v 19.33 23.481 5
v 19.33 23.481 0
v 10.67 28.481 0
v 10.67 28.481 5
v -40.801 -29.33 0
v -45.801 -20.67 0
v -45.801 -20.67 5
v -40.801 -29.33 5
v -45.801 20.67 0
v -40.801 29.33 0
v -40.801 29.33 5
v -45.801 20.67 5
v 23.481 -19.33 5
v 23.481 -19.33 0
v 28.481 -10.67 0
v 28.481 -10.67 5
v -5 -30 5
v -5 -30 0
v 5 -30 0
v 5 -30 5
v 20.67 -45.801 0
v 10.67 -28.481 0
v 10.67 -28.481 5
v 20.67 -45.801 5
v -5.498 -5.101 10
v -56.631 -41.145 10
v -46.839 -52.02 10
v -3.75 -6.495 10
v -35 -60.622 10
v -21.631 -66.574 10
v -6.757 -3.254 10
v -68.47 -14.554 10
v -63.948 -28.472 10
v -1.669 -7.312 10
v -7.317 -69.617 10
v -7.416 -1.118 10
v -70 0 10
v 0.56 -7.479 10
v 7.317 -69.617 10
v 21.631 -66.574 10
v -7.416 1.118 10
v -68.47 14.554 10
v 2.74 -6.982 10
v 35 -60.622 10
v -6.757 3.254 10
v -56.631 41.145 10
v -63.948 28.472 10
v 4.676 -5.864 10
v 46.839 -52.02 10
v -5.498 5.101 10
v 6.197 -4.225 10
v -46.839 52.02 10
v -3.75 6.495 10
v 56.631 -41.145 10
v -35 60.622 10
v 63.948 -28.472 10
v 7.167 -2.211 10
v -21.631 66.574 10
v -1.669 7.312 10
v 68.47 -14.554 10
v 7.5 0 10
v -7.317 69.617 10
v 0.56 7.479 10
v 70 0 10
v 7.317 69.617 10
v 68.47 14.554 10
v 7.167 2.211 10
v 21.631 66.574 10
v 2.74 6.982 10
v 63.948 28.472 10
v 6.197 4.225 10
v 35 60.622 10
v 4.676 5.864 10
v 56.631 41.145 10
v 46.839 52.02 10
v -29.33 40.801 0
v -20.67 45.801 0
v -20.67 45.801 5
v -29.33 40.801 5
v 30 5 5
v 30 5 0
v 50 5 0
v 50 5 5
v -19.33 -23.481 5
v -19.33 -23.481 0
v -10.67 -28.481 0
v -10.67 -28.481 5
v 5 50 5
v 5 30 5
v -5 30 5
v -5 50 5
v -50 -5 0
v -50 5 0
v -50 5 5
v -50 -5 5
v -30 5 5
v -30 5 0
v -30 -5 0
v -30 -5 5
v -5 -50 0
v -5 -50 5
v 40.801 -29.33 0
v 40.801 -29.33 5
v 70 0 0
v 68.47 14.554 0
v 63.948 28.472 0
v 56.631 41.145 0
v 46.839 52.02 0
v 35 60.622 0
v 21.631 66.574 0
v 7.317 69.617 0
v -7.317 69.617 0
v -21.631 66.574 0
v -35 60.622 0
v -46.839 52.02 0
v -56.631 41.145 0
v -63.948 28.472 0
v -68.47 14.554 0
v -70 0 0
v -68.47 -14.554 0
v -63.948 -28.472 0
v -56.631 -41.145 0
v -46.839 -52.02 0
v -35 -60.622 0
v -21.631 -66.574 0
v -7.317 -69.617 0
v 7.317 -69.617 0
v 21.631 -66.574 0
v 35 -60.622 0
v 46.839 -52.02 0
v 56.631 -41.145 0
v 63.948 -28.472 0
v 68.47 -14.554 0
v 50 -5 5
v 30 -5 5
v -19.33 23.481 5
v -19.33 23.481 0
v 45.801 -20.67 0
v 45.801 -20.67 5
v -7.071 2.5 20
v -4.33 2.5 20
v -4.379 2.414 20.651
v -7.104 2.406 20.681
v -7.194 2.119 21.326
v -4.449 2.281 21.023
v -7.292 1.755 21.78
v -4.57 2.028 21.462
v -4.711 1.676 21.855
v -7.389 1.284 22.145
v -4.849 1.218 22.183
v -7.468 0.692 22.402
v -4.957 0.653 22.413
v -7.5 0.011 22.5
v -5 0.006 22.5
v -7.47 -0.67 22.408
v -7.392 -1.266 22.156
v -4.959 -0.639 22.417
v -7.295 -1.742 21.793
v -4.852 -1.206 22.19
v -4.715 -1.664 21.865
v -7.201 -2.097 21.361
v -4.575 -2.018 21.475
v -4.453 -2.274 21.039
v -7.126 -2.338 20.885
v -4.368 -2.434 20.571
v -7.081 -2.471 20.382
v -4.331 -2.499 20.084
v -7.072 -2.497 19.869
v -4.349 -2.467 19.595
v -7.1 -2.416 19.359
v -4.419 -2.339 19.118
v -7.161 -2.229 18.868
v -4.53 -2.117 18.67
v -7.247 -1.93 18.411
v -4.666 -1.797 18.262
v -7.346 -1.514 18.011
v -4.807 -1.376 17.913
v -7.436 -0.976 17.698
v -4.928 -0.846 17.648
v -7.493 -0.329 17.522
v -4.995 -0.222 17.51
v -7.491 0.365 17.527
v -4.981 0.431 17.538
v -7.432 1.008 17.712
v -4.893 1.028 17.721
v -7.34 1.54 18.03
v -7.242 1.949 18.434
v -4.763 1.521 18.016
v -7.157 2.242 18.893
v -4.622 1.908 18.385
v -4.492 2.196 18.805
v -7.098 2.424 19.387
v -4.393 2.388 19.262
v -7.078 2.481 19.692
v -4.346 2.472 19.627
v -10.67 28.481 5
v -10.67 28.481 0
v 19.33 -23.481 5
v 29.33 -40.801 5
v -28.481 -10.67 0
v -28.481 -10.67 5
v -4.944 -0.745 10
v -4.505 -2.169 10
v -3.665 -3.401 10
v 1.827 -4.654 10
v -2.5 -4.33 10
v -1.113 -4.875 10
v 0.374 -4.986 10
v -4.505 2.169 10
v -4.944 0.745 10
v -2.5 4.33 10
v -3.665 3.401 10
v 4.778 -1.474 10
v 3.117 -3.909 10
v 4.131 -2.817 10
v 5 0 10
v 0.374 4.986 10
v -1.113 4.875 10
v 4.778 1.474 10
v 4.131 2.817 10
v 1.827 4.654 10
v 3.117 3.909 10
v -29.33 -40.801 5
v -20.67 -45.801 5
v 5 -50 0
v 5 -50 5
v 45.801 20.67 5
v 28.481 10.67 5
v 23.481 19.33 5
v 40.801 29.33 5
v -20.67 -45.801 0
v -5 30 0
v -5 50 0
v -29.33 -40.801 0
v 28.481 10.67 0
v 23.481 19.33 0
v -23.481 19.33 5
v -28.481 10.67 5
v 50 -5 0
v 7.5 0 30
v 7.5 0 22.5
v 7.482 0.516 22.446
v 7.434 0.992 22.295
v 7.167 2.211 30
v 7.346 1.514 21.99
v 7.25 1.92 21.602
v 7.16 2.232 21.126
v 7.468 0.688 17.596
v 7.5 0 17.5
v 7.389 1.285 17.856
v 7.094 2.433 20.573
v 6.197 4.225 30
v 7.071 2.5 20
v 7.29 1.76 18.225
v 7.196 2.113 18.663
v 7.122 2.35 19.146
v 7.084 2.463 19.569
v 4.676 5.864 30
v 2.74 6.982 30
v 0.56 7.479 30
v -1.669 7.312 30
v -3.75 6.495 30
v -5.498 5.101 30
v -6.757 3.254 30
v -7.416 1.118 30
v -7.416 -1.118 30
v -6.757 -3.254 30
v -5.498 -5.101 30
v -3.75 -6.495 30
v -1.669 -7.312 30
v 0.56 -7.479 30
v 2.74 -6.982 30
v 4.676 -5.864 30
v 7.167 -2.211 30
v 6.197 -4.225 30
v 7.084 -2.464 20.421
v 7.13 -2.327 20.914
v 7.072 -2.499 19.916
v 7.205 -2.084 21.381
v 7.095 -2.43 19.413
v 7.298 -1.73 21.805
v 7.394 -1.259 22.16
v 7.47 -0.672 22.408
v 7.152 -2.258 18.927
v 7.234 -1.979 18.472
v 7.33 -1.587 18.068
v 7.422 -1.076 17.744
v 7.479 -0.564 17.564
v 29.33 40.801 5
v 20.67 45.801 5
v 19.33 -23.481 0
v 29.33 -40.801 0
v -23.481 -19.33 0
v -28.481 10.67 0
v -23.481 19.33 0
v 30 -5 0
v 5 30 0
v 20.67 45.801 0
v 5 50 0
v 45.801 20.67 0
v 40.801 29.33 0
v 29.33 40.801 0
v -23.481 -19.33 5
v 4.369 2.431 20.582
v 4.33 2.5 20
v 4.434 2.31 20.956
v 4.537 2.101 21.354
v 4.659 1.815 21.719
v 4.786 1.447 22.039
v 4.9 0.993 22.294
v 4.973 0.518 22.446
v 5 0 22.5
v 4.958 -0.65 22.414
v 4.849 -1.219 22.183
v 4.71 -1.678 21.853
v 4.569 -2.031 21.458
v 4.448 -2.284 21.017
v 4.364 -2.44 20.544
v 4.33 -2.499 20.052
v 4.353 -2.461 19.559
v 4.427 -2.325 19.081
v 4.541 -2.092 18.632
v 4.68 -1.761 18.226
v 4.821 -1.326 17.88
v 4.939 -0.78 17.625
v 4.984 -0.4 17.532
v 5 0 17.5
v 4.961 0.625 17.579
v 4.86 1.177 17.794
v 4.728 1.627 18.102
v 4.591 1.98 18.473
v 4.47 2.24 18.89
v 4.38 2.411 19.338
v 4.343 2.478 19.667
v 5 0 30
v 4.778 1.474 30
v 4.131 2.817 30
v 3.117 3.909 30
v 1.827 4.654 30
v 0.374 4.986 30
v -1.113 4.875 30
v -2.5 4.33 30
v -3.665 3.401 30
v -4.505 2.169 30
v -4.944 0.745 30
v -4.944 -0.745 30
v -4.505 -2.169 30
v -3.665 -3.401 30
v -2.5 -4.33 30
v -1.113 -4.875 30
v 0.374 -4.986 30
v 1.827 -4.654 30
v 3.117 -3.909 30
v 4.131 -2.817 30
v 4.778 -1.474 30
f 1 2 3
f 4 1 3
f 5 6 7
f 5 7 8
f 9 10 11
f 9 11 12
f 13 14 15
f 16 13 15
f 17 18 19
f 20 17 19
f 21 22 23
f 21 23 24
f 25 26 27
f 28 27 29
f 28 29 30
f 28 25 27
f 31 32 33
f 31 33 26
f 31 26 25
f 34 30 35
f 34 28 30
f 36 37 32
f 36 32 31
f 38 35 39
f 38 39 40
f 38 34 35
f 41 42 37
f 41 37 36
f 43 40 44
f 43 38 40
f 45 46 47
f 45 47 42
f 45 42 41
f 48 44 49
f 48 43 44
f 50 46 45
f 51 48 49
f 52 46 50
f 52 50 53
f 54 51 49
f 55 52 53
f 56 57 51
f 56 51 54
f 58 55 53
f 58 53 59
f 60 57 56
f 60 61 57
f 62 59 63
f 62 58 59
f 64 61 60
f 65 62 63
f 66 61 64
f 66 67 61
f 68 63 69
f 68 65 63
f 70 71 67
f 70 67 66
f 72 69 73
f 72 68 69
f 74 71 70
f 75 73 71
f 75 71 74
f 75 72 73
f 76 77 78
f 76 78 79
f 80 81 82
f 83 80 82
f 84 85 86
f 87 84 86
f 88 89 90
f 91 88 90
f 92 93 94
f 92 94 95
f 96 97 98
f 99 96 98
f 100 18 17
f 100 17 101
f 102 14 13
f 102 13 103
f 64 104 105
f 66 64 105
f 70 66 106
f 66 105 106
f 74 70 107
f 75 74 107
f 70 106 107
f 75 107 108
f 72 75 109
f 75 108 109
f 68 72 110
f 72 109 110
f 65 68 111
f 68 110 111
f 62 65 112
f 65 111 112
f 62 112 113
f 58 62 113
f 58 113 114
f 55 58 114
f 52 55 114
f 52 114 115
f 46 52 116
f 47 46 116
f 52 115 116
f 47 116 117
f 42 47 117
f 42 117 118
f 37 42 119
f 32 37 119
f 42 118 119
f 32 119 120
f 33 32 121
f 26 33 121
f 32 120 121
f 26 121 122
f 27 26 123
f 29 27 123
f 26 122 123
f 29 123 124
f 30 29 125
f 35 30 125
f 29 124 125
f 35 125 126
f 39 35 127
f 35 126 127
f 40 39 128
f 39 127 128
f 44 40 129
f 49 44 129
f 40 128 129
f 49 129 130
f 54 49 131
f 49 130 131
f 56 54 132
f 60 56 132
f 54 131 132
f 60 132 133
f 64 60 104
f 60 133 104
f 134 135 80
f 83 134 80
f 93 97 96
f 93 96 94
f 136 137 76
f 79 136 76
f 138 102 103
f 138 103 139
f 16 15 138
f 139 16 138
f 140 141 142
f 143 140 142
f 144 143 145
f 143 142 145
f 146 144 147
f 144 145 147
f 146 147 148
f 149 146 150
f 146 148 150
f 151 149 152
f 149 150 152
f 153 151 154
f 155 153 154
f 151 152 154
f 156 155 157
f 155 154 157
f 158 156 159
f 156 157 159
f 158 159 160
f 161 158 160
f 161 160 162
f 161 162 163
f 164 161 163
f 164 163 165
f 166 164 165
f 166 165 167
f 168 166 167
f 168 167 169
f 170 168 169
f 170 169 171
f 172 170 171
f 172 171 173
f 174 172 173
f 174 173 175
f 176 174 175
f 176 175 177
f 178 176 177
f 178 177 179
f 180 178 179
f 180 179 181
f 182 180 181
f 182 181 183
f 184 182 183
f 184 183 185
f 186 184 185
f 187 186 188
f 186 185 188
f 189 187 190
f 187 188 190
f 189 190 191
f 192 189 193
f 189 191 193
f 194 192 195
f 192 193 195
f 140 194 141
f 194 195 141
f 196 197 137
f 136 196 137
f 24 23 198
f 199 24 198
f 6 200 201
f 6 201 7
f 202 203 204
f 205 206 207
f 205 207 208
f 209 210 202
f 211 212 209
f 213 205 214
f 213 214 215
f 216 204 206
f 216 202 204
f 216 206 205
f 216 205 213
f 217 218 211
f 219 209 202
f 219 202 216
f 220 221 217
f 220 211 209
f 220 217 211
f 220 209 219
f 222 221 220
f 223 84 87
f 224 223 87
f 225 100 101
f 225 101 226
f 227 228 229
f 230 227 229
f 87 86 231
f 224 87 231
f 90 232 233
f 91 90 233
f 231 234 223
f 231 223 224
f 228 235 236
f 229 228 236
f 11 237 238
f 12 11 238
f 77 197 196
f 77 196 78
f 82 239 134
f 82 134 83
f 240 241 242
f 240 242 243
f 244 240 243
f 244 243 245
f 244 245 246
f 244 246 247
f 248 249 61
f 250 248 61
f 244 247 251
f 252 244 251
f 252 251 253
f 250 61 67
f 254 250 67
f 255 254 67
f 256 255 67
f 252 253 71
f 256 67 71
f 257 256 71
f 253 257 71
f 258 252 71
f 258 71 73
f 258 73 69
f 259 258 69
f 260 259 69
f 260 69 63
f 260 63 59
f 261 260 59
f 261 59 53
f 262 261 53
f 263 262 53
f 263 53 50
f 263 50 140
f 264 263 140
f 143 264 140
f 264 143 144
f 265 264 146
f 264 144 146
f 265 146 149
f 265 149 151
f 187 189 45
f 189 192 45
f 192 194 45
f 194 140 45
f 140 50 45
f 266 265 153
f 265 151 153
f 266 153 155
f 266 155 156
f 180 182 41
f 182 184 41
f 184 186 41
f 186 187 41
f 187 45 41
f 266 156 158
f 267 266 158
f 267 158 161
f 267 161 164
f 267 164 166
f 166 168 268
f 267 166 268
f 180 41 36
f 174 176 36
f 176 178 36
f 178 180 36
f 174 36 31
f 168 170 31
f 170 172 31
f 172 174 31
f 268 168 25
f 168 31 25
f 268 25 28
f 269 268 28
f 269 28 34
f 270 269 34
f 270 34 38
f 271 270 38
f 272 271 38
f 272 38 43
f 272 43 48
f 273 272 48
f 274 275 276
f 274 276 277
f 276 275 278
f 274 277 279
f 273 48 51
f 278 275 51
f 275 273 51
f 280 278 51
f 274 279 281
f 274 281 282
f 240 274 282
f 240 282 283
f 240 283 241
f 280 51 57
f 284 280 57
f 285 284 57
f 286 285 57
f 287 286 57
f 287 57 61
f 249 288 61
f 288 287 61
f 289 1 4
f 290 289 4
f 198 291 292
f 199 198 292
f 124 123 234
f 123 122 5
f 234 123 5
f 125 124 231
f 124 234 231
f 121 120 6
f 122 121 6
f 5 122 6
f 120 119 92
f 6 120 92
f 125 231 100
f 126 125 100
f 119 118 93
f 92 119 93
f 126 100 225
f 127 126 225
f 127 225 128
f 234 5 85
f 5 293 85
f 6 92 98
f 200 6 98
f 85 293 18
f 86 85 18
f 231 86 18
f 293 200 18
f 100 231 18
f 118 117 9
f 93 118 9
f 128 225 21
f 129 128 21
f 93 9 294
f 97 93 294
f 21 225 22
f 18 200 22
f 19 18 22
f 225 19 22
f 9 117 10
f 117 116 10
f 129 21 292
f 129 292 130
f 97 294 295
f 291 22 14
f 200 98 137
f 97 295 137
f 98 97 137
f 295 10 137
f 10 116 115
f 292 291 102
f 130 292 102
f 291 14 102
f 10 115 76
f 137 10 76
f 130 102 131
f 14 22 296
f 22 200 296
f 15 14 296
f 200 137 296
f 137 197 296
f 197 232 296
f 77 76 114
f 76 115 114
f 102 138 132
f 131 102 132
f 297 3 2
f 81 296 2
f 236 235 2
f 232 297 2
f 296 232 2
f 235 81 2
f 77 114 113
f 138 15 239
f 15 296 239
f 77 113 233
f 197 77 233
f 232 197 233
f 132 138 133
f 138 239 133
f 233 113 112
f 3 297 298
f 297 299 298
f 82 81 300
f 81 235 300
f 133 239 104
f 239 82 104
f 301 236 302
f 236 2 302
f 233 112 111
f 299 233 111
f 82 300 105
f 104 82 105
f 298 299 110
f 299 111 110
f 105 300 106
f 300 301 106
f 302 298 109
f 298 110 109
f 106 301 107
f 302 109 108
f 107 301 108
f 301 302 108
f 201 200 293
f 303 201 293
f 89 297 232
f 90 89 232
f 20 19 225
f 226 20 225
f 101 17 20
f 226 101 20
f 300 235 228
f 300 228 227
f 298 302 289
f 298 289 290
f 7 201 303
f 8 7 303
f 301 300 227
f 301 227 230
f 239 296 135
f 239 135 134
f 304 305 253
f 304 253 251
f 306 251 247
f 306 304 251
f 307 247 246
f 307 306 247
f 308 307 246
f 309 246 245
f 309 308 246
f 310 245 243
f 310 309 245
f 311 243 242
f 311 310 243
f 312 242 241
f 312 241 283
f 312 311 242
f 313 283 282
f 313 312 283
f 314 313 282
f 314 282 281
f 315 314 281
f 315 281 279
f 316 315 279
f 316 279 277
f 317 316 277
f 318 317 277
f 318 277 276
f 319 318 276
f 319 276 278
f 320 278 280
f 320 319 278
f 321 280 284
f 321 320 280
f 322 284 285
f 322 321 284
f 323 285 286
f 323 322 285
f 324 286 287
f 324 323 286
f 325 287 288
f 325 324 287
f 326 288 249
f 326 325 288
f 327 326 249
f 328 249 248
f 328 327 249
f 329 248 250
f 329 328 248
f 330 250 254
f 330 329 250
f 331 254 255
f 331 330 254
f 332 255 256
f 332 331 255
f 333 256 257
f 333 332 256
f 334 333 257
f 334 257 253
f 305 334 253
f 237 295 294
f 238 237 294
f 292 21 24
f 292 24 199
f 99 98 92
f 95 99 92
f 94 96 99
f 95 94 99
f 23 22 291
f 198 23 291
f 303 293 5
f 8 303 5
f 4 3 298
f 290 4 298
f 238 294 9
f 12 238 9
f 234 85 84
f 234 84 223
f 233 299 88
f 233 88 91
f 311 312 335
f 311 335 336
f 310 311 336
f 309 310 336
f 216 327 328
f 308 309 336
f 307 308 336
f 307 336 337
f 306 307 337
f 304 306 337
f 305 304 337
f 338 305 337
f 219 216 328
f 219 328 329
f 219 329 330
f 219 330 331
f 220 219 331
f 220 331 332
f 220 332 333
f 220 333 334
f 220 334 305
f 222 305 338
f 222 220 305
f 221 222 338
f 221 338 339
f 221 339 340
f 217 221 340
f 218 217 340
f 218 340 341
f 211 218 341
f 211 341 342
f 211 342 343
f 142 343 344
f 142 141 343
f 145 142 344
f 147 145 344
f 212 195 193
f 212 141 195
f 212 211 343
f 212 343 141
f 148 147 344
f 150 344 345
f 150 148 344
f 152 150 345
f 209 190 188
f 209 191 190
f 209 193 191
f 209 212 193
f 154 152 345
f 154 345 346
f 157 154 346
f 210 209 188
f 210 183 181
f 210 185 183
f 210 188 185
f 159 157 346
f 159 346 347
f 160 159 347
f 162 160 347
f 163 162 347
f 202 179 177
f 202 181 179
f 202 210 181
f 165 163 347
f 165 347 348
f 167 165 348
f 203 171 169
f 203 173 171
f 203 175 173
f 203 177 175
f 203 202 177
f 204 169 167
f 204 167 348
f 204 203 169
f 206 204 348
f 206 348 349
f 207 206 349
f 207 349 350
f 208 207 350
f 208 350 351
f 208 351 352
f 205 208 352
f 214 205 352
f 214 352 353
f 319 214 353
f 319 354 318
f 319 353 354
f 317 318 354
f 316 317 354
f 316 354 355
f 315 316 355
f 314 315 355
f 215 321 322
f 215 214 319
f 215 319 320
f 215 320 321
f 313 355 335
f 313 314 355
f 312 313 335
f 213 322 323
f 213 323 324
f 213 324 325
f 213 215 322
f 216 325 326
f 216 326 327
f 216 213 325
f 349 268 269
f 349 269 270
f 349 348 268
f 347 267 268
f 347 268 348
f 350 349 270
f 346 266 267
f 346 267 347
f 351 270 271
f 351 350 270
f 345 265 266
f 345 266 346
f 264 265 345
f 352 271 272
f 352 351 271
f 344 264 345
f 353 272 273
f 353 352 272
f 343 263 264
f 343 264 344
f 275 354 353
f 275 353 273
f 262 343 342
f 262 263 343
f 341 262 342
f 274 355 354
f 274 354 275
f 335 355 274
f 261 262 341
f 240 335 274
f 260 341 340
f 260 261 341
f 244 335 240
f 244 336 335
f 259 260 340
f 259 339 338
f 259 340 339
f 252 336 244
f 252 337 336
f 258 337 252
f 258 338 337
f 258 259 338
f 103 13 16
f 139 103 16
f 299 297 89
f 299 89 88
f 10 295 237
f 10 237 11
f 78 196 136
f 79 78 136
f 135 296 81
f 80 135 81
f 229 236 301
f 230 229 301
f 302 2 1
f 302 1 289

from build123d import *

# Parameters (mm, degrees)
SKETCH_R             = 70
PAD_DEPTH            = 10
SKETCH001_W          = 10
SKETCH001_H          = 20
POCKET_DEPTH         = 5
POLARPATTERN_COUNT   = 12
SKETCH002_R          = 7.5
SKETCH002_R_2        = 5
PAD001_DEPTH         = 20
SKETCH003_R          = 2.5
POCKET001_DEPTH      = 70.001
POCKET001_DEPTH_BACK = -70.001


with BuildPart() as part:
    # Sketch → Pad (new body)
    with BuildSketch(Plane.XY):
        Circle(SKETCH_R)
    extrude(amount=PAD_DEPTH)

    # Sketch001 (on Face2 of Pad) → Pocket (cut)
    with BuildSketch(Plane(origin=(0, 0, 0), x_dir=(1, 0, 0), z_dir=(0, 0, -1))):
        with Locations((0, 40)):
            Rectangle(SKETCH001_W, SKETCH001_H)
    pocket = extrude(amount=-POCKET_DEPTH, mode=Mode.SUBTRACT)

    # PolarPattern: Pocket ×12 about axis
    polarpattern_axis = Axis((0, 0, 0), (0, 0, -1))
    for i in range(1, POLARPATTERN_COUNT):
        add(pocket.rotate(polarpattern_axis, i * 360 / POLARPATTERN_COUNT), mode=Mode.SUBTRACT)

    # Sketch002 (on Face3 of PolarPattern) → Pad001 (join)
    with BuildSketch(Plane.XY.offset(10)):
        Circle(SKETCH002_R)
        Circle(SKETCH002_R_2, mode=Mode.SUBTRACT)
    extrude(amount=PAD001_DEPTH)

    # Sketch003 → Pocket001 (cut, two sides)
    with BuildSketch(Plane.YZ) as pocket001_sk:
        with Locations((0, 20)):
            Circle(SKETCH003_R)
    extrude(amount=-POCKET001_DEPTH, mode=Mode.SUBTRACT)
    extrude(pocket001_sk.sketch, amount=-POCKET001_DEPTH_BACK, mode=Mode.SUBTRACT)


solid = part.part
